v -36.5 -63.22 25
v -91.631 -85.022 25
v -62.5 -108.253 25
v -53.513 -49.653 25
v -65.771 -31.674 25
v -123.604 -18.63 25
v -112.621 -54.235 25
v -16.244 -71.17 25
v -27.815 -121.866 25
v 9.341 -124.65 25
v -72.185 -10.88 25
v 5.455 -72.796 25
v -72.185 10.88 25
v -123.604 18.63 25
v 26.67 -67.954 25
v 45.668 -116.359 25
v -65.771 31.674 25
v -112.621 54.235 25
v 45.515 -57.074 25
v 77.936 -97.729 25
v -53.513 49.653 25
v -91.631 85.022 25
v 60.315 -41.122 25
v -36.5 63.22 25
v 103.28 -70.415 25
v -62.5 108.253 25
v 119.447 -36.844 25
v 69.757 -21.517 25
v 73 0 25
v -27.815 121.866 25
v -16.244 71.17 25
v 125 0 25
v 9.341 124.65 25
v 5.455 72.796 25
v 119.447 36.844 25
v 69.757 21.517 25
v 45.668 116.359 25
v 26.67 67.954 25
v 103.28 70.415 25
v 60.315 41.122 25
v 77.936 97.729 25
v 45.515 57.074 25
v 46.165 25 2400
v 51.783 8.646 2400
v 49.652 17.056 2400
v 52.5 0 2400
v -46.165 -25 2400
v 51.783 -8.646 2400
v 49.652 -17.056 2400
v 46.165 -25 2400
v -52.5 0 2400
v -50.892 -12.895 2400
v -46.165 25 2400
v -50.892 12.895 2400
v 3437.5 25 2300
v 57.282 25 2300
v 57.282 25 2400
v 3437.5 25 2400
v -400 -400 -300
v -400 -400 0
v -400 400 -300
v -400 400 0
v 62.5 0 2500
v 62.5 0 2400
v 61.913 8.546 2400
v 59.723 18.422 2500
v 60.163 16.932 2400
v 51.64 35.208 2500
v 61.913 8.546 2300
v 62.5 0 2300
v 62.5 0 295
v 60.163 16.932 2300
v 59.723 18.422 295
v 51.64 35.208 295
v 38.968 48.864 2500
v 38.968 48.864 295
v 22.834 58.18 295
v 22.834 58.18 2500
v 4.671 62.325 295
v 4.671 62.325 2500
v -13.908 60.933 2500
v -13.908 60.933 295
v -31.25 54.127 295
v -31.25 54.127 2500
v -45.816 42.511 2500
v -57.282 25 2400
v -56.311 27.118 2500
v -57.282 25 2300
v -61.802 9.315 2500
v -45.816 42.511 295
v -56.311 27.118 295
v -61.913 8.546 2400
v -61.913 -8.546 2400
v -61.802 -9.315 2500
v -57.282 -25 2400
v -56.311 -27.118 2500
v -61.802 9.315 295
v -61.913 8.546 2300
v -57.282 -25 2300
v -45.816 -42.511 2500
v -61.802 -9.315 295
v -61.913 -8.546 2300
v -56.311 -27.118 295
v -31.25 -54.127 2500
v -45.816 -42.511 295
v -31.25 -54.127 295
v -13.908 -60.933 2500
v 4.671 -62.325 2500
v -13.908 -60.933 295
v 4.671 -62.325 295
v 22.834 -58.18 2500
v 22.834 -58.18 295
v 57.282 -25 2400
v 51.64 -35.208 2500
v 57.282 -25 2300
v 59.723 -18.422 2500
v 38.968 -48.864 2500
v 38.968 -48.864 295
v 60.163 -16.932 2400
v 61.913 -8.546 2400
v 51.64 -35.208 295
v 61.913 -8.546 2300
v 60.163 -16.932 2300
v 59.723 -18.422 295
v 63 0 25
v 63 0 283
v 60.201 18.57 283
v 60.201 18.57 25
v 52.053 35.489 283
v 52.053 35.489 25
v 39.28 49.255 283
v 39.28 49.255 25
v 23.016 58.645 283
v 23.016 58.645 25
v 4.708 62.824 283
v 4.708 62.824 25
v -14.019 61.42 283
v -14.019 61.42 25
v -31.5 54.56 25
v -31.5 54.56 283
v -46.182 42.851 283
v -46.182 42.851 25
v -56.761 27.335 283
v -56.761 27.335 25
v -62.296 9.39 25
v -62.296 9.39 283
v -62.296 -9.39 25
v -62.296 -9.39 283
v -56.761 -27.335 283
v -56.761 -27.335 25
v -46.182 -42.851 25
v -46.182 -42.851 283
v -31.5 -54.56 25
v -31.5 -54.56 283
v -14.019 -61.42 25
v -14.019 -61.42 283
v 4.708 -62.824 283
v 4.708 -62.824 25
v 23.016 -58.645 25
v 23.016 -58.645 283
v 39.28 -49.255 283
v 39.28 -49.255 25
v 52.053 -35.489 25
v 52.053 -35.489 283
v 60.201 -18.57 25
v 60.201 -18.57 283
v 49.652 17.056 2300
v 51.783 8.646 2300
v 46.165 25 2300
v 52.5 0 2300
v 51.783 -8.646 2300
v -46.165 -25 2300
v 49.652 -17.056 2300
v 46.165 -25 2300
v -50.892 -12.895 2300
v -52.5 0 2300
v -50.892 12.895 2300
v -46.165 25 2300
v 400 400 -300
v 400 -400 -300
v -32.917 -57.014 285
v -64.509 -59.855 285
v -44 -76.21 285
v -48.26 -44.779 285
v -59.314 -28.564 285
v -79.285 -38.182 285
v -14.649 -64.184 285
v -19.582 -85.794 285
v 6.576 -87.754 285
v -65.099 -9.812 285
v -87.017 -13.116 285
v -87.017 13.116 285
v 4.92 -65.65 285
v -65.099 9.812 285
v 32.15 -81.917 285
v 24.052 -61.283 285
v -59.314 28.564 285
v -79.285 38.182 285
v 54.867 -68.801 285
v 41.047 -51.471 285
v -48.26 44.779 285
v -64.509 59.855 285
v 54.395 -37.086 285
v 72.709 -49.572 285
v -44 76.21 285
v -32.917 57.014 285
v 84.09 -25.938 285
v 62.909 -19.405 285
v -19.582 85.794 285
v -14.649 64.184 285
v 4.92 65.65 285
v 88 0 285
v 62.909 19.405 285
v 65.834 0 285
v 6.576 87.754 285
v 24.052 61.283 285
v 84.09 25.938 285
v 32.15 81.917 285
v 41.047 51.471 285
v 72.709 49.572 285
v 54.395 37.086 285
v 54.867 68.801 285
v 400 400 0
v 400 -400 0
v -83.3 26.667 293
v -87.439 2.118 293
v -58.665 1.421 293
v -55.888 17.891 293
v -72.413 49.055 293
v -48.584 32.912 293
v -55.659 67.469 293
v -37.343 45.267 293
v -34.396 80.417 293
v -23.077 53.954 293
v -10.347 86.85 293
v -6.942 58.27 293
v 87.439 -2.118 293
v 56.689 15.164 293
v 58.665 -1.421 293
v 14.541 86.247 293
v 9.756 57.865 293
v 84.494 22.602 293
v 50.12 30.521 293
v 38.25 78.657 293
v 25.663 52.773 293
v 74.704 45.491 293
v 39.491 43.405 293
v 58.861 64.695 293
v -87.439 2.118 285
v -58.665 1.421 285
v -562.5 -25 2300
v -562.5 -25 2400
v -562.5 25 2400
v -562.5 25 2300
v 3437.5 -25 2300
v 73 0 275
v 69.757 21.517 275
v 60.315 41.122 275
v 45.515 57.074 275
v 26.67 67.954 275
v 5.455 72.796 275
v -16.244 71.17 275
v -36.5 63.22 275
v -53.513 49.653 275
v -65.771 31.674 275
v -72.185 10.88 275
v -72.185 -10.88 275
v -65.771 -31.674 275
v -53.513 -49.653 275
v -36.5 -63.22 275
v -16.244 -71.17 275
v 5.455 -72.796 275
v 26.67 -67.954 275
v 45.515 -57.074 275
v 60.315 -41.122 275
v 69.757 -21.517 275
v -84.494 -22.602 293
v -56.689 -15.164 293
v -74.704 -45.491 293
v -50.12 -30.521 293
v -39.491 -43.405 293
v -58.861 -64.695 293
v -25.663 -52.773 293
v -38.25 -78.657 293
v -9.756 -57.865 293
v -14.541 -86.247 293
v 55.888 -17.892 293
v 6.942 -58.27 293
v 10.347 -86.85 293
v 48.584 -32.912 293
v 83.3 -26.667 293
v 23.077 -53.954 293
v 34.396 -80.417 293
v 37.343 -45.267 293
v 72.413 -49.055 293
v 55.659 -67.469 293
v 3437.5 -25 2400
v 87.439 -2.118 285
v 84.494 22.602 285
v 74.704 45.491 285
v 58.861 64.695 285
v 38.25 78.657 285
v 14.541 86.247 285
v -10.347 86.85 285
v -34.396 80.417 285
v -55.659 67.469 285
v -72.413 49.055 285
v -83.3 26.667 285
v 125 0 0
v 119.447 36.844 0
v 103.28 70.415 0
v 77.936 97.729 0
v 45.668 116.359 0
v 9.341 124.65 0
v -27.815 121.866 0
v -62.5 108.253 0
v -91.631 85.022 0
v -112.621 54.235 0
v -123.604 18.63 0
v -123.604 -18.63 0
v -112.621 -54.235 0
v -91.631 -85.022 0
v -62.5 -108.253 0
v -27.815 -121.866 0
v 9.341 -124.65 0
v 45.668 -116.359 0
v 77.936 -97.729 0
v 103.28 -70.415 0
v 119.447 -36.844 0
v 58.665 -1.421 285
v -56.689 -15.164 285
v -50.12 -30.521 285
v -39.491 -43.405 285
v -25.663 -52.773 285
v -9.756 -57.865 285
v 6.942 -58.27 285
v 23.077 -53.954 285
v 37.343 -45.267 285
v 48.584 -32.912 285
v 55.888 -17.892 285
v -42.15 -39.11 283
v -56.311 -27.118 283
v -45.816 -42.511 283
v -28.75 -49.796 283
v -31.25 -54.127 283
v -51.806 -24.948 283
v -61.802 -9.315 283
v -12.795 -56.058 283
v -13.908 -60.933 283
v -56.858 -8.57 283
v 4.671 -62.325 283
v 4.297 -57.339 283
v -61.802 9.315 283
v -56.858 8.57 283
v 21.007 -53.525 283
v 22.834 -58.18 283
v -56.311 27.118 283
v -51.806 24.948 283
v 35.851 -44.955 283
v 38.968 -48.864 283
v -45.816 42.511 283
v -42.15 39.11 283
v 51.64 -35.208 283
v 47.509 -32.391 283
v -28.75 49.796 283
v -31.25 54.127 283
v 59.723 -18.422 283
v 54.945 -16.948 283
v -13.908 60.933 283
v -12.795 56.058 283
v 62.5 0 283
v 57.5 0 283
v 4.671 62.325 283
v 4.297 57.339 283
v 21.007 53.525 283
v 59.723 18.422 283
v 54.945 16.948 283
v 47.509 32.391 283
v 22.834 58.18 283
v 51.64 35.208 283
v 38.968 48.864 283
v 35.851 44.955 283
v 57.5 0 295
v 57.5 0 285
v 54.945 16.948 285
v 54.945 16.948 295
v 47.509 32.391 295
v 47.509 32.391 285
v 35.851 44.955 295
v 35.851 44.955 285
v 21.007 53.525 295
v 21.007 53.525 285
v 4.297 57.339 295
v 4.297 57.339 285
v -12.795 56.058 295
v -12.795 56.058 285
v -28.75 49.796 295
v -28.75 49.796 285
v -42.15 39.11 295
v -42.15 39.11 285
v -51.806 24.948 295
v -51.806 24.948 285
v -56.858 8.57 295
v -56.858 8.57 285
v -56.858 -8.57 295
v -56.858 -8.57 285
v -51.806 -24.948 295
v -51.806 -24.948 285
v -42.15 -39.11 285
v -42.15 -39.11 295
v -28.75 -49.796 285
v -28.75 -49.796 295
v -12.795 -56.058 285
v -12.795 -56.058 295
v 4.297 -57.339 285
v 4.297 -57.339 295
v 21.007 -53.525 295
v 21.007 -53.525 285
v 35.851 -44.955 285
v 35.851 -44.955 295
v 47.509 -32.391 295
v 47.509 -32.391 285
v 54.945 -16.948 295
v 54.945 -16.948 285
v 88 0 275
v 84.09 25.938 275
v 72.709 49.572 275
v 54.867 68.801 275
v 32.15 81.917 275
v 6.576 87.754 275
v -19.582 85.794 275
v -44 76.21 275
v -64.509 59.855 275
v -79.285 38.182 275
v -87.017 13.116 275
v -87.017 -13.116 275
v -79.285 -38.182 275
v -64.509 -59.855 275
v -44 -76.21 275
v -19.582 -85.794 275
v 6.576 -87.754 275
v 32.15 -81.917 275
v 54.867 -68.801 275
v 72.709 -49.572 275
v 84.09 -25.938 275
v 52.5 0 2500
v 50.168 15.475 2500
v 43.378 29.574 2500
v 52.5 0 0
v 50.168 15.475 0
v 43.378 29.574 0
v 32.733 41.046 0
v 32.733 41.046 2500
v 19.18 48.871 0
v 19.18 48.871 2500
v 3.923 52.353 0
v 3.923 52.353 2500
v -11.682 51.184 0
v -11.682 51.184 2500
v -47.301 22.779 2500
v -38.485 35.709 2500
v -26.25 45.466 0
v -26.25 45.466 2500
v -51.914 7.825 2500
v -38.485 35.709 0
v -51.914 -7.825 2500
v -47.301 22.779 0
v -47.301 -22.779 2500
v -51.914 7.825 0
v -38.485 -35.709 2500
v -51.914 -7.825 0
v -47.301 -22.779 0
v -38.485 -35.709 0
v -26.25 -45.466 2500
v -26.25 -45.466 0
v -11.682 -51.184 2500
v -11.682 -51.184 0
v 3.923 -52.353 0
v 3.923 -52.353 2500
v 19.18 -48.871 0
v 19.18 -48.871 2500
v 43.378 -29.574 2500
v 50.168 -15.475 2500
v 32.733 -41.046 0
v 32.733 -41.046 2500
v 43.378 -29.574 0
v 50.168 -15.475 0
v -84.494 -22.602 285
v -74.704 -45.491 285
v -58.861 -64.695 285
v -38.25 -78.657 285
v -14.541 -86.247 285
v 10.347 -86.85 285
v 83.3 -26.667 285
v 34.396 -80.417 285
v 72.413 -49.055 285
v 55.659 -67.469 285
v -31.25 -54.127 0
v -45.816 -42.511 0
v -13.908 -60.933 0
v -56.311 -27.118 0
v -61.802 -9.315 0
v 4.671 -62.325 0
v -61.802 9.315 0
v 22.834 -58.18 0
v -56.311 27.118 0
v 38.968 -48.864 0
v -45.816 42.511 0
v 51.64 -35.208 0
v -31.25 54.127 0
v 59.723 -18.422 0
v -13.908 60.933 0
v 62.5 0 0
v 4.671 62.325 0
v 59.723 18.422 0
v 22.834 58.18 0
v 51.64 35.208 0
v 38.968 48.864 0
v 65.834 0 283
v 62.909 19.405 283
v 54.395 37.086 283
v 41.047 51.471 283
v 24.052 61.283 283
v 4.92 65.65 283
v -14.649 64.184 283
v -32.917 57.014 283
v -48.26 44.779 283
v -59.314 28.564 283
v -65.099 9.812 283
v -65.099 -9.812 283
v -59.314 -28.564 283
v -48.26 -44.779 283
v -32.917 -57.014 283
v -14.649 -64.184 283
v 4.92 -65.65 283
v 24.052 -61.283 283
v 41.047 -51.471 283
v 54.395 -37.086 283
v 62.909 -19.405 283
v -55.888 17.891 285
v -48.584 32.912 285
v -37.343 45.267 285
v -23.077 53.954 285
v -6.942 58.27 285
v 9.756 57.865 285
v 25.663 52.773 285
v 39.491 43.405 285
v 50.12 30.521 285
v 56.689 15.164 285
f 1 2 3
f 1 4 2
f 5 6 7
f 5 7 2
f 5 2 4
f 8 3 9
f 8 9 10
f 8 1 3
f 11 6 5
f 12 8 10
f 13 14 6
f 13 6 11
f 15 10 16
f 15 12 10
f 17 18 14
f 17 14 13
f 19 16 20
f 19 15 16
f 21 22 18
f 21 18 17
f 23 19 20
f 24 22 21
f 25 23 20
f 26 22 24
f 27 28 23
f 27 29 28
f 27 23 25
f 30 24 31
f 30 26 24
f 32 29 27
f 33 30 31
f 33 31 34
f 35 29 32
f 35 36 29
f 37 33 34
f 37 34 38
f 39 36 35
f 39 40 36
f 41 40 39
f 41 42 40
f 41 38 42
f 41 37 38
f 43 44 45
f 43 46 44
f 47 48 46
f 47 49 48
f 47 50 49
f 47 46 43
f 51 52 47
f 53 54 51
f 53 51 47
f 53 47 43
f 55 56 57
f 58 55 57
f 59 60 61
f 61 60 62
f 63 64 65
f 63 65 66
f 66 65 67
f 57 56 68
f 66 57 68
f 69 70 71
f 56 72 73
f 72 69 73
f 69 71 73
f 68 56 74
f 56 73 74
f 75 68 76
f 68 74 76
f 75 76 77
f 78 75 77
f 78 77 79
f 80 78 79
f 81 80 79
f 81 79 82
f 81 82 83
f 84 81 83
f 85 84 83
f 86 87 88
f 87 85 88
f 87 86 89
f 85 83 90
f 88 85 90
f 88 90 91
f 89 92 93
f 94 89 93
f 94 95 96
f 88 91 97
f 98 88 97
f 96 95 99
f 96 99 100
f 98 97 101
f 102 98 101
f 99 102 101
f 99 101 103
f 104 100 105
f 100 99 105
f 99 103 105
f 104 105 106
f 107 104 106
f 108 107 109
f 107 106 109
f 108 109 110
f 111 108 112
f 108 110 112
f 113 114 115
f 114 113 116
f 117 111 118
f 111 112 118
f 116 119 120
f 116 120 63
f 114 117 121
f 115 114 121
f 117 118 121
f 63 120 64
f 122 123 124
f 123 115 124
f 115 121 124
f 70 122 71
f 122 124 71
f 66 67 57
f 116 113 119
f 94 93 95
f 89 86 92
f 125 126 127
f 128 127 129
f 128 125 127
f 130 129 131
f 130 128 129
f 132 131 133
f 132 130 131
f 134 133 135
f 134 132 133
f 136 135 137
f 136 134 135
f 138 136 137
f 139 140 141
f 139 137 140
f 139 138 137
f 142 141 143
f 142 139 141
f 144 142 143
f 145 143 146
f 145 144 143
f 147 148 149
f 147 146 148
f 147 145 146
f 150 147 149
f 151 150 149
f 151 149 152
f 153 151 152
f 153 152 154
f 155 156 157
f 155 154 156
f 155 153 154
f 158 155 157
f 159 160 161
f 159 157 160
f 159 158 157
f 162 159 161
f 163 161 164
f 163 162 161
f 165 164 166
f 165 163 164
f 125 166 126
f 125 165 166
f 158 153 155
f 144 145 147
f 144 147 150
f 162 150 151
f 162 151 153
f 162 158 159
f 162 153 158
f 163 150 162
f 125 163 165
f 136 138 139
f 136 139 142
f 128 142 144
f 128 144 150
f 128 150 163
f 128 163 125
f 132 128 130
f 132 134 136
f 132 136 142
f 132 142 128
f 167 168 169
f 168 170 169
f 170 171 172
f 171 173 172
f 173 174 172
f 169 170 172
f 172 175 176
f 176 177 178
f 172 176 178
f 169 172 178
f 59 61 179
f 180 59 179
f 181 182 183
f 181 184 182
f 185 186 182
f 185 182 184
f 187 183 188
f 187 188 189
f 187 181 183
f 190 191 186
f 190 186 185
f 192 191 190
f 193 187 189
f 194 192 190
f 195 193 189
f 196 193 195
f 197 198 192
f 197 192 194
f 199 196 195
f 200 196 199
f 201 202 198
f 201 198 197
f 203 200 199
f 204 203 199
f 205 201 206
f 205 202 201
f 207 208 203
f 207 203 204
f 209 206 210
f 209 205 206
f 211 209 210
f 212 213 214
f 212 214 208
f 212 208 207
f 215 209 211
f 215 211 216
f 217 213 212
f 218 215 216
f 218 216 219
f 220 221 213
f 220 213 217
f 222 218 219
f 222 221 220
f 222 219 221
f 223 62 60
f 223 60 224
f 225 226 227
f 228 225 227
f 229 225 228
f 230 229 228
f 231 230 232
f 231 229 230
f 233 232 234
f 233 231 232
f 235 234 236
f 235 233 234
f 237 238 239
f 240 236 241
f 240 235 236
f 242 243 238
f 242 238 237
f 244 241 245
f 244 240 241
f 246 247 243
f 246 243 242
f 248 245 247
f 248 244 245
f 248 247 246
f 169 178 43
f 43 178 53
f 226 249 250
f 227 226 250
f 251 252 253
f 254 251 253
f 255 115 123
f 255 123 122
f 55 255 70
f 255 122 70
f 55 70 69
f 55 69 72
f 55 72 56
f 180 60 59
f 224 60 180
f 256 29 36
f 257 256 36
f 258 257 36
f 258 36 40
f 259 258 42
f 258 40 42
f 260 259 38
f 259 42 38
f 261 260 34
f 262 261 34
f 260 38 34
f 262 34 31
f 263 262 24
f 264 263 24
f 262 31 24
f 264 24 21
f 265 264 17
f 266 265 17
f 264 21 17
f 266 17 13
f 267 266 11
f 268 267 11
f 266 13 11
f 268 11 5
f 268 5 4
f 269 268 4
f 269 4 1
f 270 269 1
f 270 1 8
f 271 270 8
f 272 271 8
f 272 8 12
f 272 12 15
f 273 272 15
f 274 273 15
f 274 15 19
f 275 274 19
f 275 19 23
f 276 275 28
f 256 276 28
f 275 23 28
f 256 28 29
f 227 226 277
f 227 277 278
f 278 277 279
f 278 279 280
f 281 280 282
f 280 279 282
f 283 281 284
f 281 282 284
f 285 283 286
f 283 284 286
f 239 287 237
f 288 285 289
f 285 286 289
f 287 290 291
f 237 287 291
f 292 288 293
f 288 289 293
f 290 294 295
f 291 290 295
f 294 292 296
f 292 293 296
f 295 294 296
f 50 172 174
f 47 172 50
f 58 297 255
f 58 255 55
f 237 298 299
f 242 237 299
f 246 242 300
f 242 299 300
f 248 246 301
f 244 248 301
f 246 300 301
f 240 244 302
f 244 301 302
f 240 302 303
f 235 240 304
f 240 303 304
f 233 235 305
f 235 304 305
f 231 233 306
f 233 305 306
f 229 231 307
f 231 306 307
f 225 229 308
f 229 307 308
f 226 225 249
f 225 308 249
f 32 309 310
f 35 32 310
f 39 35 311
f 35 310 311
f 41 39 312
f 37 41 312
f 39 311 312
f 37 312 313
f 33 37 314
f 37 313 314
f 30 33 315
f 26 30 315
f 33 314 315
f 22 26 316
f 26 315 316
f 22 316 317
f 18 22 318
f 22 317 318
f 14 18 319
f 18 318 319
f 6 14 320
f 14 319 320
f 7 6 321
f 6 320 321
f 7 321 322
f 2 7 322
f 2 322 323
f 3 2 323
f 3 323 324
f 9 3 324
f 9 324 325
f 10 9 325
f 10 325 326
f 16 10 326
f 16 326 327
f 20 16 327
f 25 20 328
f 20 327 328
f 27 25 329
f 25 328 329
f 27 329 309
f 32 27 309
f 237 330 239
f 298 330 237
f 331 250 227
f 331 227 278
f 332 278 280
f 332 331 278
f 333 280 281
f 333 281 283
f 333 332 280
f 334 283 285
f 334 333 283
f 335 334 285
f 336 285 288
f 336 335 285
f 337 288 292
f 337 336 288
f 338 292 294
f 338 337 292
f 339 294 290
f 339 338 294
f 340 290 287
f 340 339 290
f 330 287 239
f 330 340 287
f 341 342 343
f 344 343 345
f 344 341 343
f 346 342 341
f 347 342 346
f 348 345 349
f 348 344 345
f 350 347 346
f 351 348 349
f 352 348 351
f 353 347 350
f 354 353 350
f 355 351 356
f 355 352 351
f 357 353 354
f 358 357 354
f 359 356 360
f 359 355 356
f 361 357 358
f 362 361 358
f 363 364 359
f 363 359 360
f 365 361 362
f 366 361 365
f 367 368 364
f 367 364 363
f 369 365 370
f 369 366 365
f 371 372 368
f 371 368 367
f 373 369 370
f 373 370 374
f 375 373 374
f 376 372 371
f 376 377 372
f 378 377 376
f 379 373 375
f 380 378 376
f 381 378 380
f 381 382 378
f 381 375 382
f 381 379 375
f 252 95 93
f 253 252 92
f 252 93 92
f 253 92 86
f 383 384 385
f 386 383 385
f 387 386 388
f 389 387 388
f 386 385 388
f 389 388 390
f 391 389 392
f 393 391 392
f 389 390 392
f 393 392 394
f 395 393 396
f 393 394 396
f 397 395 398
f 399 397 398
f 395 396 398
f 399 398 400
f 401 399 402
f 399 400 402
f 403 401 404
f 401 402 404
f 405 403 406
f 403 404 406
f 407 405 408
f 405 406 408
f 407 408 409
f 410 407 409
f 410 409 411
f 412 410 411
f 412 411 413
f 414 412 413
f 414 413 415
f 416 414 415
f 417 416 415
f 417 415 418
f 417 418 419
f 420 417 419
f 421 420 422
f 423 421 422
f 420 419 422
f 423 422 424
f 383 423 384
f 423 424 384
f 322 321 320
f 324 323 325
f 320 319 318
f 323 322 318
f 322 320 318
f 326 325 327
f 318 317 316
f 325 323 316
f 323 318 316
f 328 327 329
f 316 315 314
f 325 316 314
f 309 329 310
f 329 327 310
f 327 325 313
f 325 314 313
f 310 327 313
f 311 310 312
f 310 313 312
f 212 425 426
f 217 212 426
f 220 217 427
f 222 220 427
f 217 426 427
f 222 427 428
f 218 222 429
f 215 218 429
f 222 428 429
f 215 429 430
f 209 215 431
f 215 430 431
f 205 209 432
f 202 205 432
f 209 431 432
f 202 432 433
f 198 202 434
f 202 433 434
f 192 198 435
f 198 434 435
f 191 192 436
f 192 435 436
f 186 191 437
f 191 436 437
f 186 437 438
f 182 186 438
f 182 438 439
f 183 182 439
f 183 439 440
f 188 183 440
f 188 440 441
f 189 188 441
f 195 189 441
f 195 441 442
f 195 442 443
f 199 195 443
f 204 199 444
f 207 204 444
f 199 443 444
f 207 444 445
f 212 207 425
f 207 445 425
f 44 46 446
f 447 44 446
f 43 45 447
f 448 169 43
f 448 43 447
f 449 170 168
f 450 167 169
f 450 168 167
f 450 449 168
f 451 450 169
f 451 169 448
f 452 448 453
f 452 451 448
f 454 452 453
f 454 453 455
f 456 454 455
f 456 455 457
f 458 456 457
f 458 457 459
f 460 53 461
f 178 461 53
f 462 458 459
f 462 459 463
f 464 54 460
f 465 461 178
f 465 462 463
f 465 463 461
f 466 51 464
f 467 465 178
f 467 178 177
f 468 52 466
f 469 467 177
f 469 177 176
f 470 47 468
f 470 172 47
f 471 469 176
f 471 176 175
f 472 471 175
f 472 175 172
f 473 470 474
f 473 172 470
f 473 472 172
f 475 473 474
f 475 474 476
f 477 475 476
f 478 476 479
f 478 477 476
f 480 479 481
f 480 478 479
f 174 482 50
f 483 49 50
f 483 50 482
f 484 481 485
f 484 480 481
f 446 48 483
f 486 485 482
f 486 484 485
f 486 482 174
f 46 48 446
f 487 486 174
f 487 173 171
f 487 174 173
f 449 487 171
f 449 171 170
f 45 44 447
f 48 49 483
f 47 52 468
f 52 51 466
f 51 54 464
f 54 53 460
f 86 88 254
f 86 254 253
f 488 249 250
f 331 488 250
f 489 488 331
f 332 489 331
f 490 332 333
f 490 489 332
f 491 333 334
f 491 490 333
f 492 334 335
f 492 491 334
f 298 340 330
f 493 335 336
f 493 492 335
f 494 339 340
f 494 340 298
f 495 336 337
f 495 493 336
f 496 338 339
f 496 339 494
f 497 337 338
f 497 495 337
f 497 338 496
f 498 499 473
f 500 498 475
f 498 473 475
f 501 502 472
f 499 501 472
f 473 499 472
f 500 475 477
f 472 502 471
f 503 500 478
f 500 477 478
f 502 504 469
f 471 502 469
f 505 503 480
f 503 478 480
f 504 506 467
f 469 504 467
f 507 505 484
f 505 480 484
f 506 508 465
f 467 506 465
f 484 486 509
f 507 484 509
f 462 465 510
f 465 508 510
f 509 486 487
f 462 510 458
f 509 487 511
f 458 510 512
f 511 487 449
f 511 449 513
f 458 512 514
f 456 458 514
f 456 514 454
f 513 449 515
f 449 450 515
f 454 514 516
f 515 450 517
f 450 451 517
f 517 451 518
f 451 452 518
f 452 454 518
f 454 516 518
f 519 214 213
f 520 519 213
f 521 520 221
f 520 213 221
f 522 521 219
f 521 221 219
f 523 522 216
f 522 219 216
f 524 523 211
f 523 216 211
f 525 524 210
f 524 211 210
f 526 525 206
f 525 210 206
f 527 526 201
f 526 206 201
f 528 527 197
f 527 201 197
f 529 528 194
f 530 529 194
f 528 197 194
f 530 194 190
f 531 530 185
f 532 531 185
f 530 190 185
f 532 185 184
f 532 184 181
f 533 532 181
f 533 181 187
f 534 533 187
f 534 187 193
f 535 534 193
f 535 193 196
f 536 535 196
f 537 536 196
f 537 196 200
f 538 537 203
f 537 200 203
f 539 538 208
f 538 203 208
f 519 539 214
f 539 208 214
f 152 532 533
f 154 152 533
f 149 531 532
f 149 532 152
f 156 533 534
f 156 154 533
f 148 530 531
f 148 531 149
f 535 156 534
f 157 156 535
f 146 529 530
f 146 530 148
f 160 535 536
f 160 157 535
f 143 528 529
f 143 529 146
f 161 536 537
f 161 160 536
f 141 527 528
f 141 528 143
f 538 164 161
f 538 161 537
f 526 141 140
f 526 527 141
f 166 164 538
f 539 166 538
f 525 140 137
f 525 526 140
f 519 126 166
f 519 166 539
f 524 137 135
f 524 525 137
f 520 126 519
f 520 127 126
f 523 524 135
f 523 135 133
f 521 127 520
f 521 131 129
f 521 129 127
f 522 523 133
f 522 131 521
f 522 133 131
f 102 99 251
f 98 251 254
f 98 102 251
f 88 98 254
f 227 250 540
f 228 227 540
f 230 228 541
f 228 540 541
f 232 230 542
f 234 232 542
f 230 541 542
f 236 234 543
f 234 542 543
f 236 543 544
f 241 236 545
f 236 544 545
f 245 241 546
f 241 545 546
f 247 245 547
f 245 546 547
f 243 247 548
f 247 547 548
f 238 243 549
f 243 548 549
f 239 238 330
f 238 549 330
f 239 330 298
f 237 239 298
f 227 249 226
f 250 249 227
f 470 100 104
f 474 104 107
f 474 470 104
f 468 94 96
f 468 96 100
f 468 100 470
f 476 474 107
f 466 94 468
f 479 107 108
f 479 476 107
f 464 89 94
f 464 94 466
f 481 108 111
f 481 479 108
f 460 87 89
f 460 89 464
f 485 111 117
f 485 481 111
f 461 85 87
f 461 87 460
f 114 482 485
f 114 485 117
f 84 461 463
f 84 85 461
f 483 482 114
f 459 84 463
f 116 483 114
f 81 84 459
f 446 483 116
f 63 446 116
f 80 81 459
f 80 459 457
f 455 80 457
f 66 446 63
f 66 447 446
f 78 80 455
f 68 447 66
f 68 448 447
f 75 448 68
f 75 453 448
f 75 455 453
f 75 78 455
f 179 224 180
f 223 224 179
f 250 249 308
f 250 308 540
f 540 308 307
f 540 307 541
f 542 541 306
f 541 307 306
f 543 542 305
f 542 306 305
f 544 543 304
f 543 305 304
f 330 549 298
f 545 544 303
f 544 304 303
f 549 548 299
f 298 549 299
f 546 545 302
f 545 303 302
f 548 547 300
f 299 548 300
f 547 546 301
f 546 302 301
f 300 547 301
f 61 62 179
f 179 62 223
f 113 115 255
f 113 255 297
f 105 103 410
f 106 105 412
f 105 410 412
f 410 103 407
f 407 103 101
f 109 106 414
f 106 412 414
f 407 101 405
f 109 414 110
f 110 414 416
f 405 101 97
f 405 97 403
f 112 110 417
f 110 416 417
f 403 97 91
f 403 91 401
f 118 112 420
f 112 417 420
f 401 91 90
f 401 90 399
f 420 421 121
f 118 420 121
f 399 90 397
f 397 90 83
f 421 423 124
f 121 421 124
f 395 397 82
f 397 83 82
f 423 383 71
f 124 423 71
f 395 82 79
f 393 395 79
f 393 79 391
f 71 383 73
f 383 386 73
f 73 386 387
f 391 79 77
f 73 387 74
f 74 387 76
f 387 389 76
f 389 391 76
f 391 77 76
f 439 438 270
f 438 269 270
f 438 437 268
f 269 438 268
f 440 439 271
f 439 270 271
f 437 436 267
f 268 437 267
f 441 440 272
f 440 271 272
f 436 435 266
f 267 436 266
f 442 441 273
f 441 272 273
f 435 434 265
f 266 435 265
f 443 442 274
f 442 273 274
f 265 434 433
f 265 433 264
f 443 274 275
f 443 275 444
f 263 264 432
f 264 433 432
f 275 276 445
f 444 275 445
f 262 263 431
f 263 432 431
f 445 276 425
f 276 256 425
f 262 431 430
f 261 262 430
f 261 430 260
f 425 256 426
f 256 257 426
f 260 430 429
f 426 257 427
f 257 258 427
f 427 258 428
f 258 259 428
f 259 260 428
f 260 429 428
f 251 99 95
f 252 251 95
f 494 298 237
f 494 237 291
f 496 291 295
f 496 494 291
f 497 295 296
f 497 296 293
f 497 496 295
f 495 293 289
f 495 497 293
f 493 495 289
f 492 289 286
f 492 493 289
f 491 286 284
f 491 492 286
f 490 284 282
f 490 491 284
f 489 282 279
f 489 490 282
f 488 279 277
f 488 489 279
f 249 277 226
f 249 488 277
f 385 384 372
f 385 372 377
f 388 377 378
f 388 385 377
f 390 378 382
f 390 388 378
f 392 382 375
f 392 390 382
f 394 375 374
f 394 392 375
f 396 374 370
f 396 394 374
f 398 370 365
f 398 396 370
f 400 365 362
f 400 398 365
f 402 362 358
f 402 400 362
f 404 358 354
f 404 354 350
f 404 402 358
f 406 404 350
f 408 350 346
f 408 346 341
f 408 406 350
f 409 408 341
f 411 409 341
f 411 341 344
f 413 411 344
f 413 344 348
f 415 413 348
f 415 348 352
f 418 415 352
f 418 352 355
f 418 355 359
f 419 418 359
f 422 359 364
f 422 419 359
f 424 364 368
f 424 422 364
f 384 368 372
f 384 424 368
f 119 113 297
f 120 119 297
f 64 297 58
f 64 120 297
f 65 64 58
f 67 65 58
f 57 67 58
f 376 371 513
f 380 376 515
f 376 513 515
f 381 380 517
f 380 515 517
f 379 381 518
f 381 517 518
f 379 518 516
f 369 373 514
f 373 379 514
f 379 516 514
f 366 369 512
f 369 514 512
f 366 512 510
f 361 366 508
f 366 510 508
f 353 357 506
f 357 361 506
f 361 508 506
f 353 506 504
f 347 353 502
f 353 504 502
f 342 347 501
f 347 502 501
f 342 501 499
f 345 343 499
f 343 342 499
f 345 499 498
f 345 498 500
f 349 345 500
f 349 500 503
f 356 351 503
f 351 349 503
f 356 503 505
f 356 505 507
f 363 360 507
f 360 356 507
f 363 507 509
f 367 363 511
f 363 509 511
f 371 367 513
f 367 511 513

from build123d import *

# Parameters (mm, degrees)
F0_R           = 62.5
F0_R_2         = 52.5
F1_DEPTH       = 2500
F3_W           = 50
F3_H           = 100
F4_DEPTH       = 125.001
F5_W           = 50
F5_H           = 100
F6_DEPTH       = 3500
F6_DEPTH_BACK  = 500
F7_W           = 800
F7_H           = 800
F8_DEPTH       = 300
F9_R           = 125
F10_DEPTH      = 25
F11_R          = 73
F11_R_2        = 63
F12_DEPTH      = 250
F13_R          = 88
F13_R_2        = 63
F14_DEPTH      = 10
F15_R          = 65.834108
F15_R_2        = 57.5
F16_DEPTH      = 10
F16_DEPTH_BACK = 2
F18_DEPTH      = 8


with BuildPart() as f1:
    # F0 (on Top) → F1 (new body)
    with BuildSketch(Plane.XY):
        Circle(F0_R)
        Circle(F0_R_2, mode=Mode.SUBTRACT)
    extrude(amount=F1_DEPTH)

    # F3 (on offset) → F4 (cut, through all)
    with BuildSketch(Plane.YZ.offset(-62.5)):
        with Locations((0, 2350)):
            Rectangle(F3_W, F3_H)
    extrude(amount=F4_DEPTH, mode=Mode.SUBTRACT)

    # F5 (on offset) → F6 (join, two sides)
    with BuildSketch(Plane.YZ.offset(-62.5)) as f6_sk:
        with Locations((0, 2350)):
            Rectangle(F5_W, F5_H)
    extrude(amount=F6_DEPTH)
    extrude(f6_sk.sketch, amount=-F6_DEPTH_BACK)


with BuildPart() as f8:
    # F7 (on Top) → F8 (new body)
    with BuildSketch(Plane.XY):
        Rectangle(F7_W, F7_H)
    extrude(amount=-F8_DEPTH)


with BuildPart() as f10:
    # F9 (on Top) → F10 (new body)
    with BuildSketch(Plane.XY):
        Circle(F9_R)
    extrude(amount=F10_DEPTH)

    # F11 (on face) → F12 (join)
    with BuildSketch(Plane.XY.offset(25)):
        Circle(F11_R)
        Circle(F11_R_2, mode=Mode.SUBTRACT)
    extrude(amount=F12_DEPTH)

    # F13 (on face) → F14 (join)
    with BuildSketch(Plane.XY.offset(275)):
        Circle(F13_R)
        Circle(F13_R_2, mode=Mode.SUBTRACT)
    extrude(amount=F14_DEPTH)


with BuildPart() as f16_tool:
    # F15 (on face) → F16 (new body, two sides)
    with BuildSketch(Plane.XY.offset(285)) as f16_sk:
        Circle(F15_R)
        Circle(F15_R_2, mode=Mode.SUBTRACT)
    extrude(amount=F16_DEPTH)
    extrude(f16_sk.sketch, amount=-F16_DEPTH_BACK)


with BuildPart() as f1_1:
    add(f1.part)

    # F16: cut by f16_tool
    add(f16_tool.part, mode=Mode.SUBTRACT)


with BuildPart() as f10_1:
    add(f10.part)

    # F16: cut by f16_tool
    add(f16_tool.part, mode=Mode.SUBTRACT)


with BuildPart() as f18:
    # F17 (on face) → F18 (new body)
    with BuildSketch(Plane.XY.offset(285)):
        with BuildLine():
            ThreePointArc((-58.664815, 1.421273), (1.421273, 58.664815), (58.664815, -1.421273))
            Line((58.664815, -1.421273), (87.438916, -2.118383))
            ThreePointArc((87.438916, -2.118383), (2.118383, 87.438916), (-87.438916, 2.118383))
            Line((-87.438916, 2.118383), (-58.664815, 1.421273))
        make_face()
    extrude(amount=F18_DEPTH)


with BuildPart() as f19_1:
    # F19: instance of F18
    add(f18.part.mirror(Plane(origin=(-73.051866, 1.769828, 289), x_dir=(0.999707, -0.02422, 0), z_dir=(-0.02422, -0.999707, 0))))


solid = Compound([f8.part, f1_1.part, f10_1.part, f18.part, f19_1.part])
